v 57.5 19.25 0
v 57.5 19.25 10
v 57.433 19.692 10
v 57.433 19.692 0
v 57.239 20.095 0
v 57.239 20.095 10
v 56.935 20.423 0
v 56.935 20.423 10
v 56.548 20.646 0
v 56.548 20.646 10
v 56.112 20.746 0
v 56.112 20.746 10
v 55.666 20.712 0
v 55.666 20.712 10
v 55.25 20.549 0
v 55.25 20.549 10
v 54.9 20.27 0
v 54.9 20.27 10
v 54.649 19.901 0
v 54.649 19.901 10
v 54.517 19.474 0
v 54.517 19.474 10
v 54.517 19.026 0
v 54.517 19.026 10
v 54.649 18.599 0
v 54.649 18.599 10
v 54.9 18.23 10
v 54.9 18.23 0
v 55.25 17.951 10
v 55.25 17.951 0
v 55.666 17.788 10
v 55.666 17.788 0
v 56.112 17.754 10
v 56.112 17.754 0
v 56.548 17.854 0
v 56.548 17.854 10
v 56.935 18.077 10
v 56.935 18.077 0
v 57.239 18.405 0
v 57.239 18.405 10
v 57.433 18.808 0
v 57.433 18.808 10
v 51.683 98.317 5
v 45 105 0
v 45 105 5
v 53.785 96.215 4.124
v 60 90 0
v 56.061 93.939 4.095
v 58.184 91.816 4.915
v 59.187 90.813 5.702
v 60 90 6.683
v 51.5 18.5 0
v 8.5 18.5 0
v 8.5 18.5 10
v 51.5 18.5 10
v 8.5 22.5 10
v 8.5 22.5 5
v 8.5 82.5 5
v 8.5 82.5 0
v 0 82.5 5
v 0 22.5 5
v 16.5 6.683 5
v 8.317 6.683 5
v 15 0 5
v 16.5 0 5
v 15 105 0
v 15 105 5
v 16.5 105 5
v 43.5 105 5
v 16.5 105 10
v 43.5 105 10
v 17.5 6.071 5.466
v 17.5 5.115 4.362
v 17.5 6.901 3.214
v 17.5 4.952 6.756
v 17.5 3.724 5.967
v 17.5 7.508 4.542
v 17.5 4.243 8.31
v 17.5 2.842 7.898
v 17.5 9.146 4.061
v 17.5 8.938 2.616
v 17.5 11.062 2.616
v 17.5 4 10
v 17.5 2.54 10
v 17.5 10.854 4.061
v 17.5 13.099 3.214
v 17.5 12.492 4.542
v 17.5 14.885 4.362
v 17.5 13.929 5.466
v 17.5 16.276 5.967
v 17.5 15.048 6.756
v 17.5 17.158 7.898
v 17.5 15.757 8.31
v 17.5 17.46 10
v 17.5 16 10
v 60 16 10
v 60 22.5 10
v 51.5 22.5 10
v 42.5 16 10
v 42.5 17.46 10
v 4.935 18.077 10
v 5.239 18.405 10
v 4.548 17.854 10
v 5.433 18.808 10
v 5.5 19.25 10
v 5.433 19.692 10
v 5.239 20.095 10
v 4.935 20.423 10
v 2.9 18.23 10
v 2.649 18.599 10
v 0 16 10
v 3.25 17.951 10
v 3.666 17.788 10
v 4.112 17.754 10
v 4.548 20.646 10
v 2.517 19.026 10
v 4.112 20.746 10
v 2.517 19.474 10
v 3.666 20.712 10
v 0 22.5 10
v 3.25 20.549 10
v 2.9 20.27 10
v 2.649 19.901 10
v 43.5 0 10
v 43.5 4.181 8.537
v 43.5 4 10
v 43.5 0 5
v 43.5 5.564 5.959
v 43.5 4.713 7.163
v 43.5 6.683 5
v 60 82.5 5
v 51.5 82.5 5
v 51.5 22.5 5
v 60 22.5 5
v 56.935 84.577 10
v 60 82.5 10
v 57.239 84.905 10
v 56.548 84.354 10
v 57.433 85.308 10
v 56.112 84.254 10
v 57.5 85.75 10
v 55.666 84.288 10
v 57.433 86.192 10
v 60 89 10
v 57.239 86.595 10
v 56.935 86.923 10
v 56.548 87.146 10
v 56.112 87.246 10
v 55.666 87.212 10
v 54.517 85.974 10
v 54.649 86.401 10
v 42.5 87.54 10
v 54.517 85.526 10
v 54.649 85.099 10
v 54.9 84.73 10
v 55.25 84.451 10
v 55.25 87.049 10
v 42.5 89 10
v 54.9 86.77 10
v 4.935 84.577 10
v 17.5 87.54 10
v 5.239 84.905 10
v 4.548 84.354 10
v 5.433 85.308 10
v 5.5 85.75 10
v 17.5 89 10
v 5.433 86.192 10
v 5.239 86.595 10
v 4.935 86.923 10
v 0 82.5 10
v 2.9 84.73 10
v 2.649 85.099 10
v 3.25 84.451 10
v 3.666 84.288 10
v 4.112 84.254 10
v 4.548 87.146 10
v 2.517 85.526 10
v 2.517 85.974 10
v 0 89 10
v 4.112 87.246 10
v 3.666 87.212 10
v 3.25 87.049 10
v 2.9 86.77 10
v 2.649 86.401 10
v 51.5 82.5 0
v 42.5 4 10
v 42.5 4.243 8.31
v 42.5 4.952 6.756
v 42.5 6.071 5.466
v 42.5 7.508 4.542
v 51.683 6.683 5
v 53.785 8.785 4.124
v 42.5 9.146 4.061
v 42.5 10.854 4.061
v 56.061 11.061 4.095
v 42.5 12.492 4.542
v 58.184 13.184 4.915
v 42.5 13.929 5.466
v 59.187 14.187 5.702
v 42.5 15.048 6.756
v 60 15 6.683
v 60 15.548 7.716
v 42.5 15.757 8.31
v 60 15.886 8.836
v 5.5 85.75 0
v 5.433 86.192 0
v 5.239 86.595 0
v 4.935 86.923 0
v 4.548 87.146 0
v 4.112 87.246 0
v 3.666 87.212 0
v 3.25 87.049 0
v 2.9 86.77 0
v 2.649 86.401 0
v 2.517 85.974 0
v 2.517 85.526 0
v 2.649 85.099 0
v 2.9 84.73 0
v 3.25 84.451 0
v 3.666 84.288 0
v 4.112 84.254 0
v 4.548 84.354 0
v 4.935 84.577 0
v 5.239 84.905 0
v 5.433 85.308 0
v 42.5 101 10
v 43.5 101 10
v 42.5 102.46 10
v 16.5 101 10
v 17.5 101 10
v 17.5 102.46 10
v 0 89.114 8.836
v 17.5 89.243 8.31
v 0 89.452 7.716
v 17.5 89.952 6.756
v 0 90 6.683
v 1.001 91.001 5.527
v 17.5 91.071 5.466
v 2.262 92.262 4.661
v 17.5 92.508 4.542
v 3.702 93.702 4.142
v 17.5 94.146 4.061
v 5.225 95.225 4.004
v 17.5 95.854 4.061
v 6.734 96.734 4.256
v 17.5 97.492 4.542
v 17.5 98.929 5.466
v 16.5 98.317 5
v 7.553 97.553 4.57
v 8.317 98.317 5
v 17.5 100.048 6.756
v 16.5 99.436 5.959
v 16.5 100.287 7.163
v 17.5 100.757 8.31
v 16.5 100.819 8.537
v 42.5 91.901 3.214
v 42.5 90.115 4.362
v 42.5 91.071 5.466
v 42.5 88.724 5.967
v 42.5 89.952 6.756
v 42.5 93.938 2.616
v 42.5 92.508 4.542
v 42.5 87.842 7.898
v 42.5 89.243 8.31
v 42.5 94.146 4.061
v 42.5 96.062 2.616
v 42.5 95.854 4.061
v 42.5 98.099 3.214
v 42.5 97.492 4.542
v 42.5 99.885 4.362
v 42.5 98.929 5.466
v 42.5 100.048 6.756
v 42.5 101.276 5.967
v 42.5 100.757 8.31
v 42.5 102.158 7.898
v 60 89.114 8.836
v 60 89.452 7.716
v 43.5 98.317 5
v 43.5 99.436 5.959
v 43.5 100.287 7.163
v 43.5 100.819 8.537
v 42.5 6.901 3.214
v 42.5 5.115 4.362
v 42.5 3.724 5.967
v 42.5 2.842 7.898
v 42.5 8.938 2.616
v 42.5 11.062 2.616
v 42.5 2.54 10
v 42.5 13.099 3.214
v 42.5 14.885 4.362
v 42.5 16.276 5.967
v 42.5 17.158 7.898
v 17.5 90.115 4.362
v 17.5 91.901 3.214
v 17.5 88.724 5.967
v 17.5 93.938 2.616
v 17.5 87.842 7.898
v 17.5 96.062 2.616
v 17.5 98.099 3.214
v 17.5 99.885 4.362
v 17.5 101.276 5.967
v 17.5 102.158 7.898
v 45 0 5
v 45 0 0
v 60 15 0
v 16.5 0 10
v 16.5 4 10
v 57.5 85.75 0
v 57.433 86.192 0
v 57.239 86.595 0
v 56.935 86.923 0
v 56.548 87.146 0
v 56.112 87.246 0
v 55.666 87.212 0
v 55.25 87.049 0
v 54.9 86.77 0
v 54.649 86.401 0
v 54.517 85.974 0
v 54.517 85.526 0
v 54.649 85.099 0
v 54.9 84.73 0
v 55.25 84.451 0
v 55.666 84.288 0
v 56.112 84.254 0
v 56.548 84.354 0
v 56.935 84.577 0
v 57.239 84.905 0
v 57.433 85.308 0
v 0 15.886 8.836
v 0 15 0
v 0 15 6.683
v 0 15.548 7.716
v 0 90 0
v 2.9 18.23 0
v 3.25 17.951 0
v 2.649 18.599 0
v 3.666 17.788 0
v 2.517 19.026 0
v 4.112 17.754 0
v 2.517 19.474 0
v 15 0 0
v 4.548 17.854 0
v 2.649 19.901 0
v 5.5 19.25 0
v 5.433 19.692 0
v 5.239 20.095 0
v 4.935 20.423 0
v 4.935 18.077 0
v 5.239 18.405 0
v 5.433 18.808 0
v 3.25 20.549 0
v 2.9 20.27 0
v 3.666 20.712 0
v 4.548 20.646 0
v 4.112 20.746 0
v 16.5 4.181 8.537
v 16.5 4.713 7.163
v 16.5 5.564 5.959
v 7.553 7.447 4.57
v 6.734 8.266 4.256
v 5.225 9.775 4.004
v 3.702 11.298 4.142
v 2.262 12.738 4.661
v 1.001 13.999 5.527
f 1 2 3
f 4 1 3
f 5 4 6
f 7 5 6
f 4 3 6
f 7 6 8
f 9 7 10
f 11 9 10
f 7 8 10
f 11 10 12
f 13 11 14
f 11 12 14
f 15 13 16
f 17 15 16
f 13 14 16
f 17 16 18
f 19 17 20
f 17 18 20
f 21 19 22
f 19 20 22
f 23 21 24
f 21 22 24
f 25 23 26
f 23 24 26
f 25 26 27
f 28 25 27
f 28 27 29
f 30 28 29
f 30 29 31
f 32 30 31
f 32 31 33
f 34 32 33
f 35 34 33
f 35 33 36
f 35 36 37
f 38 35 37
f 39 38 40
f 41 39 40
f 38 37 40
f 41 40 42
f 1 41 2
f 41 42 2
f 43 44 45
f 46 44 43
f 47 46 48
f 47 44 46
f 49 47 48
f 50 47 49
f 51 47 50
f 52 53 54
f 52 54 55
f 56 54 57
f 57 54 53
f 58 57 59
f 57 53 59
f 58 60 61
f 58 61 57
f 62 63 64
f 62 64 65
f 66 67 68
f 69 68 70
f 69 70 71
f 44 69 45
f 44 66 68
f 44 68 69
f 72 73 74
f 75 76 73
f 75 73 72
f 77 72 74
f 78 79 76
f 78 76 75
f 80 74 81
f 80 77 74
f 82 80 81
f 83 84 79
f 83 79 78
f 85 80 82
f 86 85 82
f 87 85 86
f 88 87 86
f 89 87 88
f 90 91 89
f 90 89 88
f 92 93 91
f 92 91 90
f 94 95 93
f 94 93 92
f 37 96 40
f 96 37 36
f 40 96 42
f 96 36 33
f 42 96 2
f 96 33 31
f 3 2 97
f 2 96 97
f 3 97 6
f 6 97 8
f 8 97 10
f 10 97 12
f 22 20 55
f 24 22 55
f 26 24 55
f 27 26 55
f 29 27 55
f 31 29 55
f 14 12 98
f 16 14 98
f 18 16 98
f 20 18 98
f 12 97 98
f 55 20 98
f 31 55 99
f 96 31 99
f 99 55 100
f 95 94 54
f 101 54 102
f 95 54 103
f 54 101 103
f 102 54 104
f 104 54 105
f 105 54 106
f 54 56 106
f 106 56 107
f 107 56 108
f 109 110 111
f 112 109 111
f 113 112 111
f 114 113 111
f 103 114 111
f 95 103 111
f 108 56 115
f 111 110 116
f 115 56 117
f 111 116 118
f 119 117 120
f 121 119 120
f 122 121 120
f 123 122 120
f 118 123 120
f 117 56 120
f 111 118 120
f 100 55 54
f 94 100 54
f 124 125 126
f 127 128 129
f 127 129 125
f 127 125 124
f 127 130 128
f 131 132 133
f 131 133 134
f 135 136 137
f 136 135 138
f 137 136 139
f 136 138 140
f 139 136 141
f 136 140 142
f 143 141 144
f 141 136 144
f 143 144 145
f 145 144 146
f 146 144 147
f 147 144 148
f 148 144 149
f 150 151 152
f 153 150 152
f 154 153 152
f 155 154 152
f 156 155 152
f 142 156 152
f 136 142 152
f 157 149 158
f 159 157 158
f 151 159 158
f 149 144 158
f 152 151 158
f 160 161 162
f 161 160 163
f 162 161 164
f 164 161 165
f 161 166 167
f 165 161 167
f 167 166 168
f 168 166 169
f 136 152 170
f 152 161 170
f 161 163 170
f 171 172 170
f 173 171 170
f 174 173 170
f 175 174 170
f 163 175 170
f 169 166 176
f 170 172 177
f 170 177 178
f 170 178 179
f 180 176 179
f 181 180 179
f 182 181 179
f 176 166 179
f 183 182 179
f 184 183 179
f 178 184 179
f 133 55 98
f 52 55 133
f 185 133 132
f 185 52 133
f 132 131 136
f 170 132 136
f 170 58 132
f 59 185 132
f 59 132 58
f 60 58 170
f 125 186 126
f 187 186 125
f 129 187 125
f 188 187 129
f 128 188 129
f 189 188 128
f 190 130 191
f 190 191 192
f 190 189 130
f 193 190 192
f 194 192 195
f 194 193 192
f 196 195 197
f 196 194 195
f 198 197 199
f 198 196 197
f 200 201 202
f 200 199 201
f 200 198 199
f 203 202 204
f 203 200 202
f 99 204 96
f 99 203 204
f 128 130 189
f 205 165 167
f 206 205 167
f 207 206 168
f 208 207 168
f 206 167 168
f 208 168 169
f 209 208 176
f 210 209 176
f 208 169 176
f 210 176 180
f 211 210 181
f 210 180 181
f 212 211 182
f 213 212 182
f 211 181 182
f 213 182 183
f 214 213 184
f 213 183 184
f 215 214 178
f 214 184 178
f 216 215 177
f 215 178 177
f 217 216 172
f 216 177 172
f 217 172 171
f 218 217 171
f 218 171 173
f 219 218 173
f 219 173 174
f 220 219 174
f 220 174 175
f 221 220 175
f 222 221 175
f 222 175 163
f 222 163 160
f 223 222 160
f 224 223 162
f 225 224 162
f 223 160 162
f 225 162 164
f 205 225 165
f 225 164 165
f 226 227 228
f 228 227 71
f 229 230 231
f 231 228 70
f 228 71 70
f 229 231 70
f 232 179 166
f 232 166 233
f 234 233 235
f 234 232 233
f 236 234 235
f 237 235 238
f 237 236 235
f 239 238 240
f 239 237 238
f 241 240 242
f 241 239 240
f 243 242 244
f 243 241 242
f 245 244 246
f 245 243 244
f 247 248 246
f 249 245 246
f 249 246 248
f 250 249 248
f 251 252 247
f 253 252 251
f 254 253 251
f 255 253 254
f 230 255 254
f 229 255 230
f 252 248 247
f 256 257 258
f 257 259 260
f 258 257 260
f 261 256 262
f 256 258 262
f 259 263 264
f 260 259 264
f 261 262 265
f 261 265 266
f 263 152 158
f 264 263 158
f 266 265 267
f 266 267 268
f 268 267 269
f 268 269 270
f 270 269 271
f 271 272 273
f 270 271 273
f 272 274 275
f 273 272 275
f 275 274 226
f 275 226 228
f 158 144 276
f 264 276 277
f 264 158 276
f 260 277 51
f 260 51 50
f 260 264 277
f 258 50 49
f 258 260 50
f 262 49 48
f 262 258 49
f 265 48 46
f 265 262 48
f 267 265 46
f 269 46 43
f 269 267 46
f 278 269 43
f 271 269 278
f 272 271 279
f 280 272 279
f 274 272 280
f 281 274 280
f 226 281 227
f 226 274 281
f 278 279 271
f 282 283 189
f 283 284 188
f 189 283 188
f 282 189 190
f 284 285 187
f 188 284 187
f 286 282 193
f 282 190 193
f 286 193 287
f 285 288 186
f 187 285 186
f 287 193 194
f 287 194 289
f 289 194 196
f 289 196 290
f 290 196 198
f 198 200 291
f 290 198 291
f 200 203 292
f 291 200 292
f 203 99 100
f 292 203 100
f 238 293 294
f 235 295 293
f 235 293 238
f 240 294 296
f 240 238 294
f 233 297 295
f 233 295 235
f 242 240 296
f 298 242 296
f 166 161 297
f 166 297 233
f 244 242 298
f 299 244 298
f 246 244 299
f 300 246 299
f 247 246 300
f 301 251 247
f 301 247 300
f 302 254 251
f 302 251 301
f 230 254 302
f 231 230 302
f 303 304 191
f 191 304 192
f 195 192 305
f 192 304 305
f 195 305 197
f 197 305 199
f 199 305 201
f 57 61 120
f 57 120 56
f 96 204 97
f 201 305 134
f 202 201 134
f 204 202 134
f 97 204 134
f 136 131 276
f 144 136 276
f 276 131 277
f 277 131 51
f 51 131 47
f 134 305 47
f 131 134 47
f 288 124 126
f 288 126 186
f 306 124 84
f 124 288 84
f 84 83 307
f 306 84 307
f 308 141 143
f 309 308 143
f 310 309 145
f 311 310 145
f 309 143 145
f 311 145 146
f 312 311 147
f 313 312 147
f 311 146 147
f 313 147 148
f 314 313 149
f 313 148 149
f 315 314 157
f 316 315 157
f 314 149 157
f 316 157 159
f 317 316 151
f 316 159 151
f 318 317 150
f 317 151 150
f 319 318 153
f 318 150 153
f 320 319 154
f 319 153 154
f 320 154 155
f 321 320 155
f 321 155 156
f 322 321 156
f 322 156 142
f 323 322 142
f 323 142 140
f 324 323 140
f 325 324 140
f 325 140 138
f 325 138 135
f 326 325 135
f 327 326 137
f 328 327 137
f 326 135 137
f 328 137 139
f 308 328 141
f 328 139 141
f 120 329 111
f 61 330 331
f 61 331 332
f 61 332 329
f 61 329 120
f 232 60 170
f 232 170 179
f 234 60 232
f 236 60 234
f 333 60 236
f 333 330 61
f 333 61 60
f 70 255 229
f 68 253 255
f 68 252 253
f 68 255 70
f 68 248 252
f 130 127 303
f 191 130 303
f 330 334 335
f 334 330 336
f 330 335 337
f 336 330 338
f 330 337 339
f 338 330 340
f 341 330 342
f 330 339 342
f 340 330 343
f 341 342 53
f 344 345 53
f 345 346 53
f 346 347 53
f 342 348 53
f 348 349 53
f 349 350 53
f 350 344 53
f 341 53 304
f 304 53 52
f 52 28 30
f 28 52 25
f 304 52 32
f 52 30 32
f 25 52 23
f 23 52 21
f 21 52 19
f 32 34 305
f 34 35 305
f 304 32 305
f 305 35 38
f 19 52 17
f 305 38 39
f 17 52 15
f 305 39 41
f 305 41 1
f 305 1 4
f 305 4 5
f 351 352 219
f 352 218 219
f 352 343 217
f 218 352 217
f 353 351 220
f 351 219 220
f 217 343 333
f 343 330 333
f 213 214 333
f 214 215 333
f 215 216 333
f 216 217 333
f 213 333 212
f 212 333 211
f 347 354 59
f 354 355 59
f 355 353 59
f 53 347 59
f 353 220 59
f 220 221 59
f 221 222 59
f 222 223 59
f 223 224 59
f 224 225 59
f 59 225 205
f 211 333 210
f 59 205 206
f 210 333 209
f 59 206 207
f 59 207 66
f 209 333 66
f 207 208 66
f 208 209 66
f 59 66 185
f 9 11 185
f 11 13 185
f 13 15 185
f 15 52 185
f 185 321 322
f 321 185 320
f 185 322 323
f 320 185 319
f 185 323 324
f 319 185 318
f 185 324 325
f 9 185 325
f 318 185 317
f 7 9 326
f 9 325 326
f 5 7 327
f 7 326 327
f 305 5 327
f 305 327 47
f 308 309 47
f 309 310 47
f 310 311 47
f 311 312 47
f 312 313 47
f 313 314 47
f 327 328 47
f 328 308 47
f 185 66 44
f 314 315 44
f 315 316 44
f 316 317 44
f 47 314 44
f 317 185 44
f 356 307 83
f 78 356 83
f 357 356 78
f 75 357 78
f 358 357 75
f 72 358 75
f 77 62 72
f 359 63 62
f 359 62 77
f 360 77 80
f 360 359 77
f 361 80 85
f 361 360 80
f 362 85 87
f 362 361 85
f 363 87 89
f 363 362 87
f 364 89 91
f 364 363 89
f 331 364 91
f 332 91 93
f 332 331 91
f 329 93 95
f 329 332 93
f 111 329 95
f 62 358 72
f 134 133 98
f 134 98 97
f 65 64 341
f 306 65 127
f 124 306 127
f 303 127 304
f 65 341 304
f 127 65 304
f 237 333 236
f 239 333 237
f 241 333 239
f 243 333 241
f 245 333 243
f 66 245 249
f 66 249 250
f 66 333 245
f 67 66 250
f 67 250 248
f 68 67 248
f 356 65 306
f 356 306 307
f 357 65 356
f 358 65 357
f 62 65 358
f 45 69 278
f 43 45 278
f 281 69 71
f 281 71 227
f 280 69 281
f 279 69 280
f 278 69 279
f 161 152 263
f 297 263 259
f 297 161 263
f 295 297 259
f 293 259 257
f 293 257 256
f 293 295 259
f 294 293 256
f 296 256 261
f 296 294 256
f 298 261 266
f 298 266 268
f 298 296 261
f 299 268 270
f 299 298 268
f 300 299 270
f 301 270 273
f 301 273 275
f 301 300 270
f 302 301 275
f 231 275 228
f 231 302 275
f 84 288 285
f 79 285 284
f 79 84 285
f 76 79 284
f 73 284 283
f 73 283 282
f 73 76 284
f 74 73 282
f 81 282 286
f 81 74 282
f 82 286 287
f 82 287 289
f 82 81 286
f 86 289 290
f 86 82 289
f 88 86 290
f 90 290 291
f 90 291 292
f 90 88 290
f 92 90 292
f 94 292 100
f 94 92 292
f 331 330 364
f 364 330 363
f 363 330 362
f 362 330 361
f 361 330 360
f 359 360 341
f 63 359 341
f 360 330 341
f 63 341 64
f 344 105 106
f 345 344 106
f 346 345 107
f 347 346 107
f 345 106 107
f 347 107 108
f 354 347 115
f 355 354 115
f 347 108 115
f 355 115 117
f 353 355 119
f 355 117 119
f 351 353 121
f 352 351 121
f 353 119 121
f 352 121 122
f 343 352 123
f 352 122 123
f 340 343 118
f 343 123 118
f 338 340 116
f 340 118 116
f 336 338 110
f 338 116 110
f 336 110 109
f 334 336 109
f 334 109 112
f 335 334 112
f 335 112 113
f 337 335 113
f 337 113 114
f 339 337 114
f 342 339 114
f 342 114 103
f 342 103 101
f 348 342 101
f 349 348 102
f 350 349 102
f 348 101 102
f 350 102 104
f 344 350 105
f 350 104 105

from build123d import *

# Parameters (mm, degrees)
SKETCH004_R  = 6
PAD003_DEPTH = 60
SKETCH005_R  = 1.5
PAD004_DEPTH = 10
SKETCH003_R  = 7.46
PAD002_DEPTH = 25
SKETCH_W     = 60
SKETCH_H     = 105
SKETCH_W_2   = 43
SKETCH_H_2   = 64
PAD_DEPTH    = 5
PAD001_DEPTH = 5
CHAMFER_SIZE = 15


with BuildPart() as rodmount:
    # Sketch004 → Pad003 (new body)
    with BuildSketch(Plane.YZ):
        with Locations((10, 10)):
            Circle(SKETCH004_R)
        with Locations((95, 10)):
            Circle(SKETCH004_R)
    extrude(amount=PAD003_DEPTH)


with BuildPart() as basemountpoints:
    # Sketch005 → Pad004 (new body)
    with BuildSketch(Plane.XY.offset(10)):
        with Locations((4, 19.25)):
            Circle(SKETCH005_R)
        with Locations((56, 19.25)):
            Circle(SKETCH005_R)
        with Locations((56, 85.75)):
            Circle(SKETCH005_R)
        with Locations((4, 85.75)):
            Circle(SKETCH005_R)
    extrude(amount=-PAD004_DEPTH)


with BuildPart() as cutblocks:
    # Sketch003 → Pad002 (new body)
    with BuildSketch(Plane.YZ.offset(17.5)):
        with Locations((10, 10)):
            Circle(SKETCH003_R)
        with Locations((95, 10)):
            Circle(SKETCH003_R)
    extrude(amount=PAD002_DEPTH)

    # Fusion: union RodMount, BaseMountPoints
    add(rodmount.part)
    add(basemountpoints.part)


with BuildPart() as base:
    # Sketch → Pad (new body)
    with BuildSketch(Plane.XY):
        with Locations((30, 52.5)):
            Rectangle(SKETCH_W, SKETCH_H)
        with Locations((30, 50.5)):
            Rectangle(SKETCH_W_2, SKETCH_H_2, mode=Mode.SUBTRACT)
    extrude(amount=PAD_DEPTH)


with BuildPart() as chamfer_body:
    # Pad001 base: copy of Base
    add(base.part)

    # Sketch001 → Pad001 (new body)
    with BuildSketch(Plane.XY.offset(5)):
        Polygon((16.5, 105), (43.5, 105), (43.5, 92.5), (60, 92.5), (60, 82.5), (0, 82.5), (0, 92.5), (16.5, 92.5), align=None)
        Polygon((43.5, 0), (16.5, 0), (16.5, 12.5), (0, 12.5), (0, 22.5), (8.5, 22.5), (8.5, 18.5), (51.5, 18.5), (51.5, 22.5), (60, 22.5), (60, 12.5), (43.5, 12.5), align=None)
    extrude(amount=PAD001_DEPTH)

    # Fusion001: union Base
    add(base.part)

    # Cut: cut CutBlocks
    add(cutblocks.part, mode=Mode.SUBTRACT)

    # Chamfer
    chamfer_edges = [chamfer_body.edges().sort_by_distance(p)[0] for p in [
        (60, 105, 2.5),
        (0, 105, 2.5),
        (60, 0, 2.5),
        (0, 0, 2.5),
    ]]
    chamfer(chamfer_edges, length=CHAMFER_SIZE)


solid = chamfer_body.part
